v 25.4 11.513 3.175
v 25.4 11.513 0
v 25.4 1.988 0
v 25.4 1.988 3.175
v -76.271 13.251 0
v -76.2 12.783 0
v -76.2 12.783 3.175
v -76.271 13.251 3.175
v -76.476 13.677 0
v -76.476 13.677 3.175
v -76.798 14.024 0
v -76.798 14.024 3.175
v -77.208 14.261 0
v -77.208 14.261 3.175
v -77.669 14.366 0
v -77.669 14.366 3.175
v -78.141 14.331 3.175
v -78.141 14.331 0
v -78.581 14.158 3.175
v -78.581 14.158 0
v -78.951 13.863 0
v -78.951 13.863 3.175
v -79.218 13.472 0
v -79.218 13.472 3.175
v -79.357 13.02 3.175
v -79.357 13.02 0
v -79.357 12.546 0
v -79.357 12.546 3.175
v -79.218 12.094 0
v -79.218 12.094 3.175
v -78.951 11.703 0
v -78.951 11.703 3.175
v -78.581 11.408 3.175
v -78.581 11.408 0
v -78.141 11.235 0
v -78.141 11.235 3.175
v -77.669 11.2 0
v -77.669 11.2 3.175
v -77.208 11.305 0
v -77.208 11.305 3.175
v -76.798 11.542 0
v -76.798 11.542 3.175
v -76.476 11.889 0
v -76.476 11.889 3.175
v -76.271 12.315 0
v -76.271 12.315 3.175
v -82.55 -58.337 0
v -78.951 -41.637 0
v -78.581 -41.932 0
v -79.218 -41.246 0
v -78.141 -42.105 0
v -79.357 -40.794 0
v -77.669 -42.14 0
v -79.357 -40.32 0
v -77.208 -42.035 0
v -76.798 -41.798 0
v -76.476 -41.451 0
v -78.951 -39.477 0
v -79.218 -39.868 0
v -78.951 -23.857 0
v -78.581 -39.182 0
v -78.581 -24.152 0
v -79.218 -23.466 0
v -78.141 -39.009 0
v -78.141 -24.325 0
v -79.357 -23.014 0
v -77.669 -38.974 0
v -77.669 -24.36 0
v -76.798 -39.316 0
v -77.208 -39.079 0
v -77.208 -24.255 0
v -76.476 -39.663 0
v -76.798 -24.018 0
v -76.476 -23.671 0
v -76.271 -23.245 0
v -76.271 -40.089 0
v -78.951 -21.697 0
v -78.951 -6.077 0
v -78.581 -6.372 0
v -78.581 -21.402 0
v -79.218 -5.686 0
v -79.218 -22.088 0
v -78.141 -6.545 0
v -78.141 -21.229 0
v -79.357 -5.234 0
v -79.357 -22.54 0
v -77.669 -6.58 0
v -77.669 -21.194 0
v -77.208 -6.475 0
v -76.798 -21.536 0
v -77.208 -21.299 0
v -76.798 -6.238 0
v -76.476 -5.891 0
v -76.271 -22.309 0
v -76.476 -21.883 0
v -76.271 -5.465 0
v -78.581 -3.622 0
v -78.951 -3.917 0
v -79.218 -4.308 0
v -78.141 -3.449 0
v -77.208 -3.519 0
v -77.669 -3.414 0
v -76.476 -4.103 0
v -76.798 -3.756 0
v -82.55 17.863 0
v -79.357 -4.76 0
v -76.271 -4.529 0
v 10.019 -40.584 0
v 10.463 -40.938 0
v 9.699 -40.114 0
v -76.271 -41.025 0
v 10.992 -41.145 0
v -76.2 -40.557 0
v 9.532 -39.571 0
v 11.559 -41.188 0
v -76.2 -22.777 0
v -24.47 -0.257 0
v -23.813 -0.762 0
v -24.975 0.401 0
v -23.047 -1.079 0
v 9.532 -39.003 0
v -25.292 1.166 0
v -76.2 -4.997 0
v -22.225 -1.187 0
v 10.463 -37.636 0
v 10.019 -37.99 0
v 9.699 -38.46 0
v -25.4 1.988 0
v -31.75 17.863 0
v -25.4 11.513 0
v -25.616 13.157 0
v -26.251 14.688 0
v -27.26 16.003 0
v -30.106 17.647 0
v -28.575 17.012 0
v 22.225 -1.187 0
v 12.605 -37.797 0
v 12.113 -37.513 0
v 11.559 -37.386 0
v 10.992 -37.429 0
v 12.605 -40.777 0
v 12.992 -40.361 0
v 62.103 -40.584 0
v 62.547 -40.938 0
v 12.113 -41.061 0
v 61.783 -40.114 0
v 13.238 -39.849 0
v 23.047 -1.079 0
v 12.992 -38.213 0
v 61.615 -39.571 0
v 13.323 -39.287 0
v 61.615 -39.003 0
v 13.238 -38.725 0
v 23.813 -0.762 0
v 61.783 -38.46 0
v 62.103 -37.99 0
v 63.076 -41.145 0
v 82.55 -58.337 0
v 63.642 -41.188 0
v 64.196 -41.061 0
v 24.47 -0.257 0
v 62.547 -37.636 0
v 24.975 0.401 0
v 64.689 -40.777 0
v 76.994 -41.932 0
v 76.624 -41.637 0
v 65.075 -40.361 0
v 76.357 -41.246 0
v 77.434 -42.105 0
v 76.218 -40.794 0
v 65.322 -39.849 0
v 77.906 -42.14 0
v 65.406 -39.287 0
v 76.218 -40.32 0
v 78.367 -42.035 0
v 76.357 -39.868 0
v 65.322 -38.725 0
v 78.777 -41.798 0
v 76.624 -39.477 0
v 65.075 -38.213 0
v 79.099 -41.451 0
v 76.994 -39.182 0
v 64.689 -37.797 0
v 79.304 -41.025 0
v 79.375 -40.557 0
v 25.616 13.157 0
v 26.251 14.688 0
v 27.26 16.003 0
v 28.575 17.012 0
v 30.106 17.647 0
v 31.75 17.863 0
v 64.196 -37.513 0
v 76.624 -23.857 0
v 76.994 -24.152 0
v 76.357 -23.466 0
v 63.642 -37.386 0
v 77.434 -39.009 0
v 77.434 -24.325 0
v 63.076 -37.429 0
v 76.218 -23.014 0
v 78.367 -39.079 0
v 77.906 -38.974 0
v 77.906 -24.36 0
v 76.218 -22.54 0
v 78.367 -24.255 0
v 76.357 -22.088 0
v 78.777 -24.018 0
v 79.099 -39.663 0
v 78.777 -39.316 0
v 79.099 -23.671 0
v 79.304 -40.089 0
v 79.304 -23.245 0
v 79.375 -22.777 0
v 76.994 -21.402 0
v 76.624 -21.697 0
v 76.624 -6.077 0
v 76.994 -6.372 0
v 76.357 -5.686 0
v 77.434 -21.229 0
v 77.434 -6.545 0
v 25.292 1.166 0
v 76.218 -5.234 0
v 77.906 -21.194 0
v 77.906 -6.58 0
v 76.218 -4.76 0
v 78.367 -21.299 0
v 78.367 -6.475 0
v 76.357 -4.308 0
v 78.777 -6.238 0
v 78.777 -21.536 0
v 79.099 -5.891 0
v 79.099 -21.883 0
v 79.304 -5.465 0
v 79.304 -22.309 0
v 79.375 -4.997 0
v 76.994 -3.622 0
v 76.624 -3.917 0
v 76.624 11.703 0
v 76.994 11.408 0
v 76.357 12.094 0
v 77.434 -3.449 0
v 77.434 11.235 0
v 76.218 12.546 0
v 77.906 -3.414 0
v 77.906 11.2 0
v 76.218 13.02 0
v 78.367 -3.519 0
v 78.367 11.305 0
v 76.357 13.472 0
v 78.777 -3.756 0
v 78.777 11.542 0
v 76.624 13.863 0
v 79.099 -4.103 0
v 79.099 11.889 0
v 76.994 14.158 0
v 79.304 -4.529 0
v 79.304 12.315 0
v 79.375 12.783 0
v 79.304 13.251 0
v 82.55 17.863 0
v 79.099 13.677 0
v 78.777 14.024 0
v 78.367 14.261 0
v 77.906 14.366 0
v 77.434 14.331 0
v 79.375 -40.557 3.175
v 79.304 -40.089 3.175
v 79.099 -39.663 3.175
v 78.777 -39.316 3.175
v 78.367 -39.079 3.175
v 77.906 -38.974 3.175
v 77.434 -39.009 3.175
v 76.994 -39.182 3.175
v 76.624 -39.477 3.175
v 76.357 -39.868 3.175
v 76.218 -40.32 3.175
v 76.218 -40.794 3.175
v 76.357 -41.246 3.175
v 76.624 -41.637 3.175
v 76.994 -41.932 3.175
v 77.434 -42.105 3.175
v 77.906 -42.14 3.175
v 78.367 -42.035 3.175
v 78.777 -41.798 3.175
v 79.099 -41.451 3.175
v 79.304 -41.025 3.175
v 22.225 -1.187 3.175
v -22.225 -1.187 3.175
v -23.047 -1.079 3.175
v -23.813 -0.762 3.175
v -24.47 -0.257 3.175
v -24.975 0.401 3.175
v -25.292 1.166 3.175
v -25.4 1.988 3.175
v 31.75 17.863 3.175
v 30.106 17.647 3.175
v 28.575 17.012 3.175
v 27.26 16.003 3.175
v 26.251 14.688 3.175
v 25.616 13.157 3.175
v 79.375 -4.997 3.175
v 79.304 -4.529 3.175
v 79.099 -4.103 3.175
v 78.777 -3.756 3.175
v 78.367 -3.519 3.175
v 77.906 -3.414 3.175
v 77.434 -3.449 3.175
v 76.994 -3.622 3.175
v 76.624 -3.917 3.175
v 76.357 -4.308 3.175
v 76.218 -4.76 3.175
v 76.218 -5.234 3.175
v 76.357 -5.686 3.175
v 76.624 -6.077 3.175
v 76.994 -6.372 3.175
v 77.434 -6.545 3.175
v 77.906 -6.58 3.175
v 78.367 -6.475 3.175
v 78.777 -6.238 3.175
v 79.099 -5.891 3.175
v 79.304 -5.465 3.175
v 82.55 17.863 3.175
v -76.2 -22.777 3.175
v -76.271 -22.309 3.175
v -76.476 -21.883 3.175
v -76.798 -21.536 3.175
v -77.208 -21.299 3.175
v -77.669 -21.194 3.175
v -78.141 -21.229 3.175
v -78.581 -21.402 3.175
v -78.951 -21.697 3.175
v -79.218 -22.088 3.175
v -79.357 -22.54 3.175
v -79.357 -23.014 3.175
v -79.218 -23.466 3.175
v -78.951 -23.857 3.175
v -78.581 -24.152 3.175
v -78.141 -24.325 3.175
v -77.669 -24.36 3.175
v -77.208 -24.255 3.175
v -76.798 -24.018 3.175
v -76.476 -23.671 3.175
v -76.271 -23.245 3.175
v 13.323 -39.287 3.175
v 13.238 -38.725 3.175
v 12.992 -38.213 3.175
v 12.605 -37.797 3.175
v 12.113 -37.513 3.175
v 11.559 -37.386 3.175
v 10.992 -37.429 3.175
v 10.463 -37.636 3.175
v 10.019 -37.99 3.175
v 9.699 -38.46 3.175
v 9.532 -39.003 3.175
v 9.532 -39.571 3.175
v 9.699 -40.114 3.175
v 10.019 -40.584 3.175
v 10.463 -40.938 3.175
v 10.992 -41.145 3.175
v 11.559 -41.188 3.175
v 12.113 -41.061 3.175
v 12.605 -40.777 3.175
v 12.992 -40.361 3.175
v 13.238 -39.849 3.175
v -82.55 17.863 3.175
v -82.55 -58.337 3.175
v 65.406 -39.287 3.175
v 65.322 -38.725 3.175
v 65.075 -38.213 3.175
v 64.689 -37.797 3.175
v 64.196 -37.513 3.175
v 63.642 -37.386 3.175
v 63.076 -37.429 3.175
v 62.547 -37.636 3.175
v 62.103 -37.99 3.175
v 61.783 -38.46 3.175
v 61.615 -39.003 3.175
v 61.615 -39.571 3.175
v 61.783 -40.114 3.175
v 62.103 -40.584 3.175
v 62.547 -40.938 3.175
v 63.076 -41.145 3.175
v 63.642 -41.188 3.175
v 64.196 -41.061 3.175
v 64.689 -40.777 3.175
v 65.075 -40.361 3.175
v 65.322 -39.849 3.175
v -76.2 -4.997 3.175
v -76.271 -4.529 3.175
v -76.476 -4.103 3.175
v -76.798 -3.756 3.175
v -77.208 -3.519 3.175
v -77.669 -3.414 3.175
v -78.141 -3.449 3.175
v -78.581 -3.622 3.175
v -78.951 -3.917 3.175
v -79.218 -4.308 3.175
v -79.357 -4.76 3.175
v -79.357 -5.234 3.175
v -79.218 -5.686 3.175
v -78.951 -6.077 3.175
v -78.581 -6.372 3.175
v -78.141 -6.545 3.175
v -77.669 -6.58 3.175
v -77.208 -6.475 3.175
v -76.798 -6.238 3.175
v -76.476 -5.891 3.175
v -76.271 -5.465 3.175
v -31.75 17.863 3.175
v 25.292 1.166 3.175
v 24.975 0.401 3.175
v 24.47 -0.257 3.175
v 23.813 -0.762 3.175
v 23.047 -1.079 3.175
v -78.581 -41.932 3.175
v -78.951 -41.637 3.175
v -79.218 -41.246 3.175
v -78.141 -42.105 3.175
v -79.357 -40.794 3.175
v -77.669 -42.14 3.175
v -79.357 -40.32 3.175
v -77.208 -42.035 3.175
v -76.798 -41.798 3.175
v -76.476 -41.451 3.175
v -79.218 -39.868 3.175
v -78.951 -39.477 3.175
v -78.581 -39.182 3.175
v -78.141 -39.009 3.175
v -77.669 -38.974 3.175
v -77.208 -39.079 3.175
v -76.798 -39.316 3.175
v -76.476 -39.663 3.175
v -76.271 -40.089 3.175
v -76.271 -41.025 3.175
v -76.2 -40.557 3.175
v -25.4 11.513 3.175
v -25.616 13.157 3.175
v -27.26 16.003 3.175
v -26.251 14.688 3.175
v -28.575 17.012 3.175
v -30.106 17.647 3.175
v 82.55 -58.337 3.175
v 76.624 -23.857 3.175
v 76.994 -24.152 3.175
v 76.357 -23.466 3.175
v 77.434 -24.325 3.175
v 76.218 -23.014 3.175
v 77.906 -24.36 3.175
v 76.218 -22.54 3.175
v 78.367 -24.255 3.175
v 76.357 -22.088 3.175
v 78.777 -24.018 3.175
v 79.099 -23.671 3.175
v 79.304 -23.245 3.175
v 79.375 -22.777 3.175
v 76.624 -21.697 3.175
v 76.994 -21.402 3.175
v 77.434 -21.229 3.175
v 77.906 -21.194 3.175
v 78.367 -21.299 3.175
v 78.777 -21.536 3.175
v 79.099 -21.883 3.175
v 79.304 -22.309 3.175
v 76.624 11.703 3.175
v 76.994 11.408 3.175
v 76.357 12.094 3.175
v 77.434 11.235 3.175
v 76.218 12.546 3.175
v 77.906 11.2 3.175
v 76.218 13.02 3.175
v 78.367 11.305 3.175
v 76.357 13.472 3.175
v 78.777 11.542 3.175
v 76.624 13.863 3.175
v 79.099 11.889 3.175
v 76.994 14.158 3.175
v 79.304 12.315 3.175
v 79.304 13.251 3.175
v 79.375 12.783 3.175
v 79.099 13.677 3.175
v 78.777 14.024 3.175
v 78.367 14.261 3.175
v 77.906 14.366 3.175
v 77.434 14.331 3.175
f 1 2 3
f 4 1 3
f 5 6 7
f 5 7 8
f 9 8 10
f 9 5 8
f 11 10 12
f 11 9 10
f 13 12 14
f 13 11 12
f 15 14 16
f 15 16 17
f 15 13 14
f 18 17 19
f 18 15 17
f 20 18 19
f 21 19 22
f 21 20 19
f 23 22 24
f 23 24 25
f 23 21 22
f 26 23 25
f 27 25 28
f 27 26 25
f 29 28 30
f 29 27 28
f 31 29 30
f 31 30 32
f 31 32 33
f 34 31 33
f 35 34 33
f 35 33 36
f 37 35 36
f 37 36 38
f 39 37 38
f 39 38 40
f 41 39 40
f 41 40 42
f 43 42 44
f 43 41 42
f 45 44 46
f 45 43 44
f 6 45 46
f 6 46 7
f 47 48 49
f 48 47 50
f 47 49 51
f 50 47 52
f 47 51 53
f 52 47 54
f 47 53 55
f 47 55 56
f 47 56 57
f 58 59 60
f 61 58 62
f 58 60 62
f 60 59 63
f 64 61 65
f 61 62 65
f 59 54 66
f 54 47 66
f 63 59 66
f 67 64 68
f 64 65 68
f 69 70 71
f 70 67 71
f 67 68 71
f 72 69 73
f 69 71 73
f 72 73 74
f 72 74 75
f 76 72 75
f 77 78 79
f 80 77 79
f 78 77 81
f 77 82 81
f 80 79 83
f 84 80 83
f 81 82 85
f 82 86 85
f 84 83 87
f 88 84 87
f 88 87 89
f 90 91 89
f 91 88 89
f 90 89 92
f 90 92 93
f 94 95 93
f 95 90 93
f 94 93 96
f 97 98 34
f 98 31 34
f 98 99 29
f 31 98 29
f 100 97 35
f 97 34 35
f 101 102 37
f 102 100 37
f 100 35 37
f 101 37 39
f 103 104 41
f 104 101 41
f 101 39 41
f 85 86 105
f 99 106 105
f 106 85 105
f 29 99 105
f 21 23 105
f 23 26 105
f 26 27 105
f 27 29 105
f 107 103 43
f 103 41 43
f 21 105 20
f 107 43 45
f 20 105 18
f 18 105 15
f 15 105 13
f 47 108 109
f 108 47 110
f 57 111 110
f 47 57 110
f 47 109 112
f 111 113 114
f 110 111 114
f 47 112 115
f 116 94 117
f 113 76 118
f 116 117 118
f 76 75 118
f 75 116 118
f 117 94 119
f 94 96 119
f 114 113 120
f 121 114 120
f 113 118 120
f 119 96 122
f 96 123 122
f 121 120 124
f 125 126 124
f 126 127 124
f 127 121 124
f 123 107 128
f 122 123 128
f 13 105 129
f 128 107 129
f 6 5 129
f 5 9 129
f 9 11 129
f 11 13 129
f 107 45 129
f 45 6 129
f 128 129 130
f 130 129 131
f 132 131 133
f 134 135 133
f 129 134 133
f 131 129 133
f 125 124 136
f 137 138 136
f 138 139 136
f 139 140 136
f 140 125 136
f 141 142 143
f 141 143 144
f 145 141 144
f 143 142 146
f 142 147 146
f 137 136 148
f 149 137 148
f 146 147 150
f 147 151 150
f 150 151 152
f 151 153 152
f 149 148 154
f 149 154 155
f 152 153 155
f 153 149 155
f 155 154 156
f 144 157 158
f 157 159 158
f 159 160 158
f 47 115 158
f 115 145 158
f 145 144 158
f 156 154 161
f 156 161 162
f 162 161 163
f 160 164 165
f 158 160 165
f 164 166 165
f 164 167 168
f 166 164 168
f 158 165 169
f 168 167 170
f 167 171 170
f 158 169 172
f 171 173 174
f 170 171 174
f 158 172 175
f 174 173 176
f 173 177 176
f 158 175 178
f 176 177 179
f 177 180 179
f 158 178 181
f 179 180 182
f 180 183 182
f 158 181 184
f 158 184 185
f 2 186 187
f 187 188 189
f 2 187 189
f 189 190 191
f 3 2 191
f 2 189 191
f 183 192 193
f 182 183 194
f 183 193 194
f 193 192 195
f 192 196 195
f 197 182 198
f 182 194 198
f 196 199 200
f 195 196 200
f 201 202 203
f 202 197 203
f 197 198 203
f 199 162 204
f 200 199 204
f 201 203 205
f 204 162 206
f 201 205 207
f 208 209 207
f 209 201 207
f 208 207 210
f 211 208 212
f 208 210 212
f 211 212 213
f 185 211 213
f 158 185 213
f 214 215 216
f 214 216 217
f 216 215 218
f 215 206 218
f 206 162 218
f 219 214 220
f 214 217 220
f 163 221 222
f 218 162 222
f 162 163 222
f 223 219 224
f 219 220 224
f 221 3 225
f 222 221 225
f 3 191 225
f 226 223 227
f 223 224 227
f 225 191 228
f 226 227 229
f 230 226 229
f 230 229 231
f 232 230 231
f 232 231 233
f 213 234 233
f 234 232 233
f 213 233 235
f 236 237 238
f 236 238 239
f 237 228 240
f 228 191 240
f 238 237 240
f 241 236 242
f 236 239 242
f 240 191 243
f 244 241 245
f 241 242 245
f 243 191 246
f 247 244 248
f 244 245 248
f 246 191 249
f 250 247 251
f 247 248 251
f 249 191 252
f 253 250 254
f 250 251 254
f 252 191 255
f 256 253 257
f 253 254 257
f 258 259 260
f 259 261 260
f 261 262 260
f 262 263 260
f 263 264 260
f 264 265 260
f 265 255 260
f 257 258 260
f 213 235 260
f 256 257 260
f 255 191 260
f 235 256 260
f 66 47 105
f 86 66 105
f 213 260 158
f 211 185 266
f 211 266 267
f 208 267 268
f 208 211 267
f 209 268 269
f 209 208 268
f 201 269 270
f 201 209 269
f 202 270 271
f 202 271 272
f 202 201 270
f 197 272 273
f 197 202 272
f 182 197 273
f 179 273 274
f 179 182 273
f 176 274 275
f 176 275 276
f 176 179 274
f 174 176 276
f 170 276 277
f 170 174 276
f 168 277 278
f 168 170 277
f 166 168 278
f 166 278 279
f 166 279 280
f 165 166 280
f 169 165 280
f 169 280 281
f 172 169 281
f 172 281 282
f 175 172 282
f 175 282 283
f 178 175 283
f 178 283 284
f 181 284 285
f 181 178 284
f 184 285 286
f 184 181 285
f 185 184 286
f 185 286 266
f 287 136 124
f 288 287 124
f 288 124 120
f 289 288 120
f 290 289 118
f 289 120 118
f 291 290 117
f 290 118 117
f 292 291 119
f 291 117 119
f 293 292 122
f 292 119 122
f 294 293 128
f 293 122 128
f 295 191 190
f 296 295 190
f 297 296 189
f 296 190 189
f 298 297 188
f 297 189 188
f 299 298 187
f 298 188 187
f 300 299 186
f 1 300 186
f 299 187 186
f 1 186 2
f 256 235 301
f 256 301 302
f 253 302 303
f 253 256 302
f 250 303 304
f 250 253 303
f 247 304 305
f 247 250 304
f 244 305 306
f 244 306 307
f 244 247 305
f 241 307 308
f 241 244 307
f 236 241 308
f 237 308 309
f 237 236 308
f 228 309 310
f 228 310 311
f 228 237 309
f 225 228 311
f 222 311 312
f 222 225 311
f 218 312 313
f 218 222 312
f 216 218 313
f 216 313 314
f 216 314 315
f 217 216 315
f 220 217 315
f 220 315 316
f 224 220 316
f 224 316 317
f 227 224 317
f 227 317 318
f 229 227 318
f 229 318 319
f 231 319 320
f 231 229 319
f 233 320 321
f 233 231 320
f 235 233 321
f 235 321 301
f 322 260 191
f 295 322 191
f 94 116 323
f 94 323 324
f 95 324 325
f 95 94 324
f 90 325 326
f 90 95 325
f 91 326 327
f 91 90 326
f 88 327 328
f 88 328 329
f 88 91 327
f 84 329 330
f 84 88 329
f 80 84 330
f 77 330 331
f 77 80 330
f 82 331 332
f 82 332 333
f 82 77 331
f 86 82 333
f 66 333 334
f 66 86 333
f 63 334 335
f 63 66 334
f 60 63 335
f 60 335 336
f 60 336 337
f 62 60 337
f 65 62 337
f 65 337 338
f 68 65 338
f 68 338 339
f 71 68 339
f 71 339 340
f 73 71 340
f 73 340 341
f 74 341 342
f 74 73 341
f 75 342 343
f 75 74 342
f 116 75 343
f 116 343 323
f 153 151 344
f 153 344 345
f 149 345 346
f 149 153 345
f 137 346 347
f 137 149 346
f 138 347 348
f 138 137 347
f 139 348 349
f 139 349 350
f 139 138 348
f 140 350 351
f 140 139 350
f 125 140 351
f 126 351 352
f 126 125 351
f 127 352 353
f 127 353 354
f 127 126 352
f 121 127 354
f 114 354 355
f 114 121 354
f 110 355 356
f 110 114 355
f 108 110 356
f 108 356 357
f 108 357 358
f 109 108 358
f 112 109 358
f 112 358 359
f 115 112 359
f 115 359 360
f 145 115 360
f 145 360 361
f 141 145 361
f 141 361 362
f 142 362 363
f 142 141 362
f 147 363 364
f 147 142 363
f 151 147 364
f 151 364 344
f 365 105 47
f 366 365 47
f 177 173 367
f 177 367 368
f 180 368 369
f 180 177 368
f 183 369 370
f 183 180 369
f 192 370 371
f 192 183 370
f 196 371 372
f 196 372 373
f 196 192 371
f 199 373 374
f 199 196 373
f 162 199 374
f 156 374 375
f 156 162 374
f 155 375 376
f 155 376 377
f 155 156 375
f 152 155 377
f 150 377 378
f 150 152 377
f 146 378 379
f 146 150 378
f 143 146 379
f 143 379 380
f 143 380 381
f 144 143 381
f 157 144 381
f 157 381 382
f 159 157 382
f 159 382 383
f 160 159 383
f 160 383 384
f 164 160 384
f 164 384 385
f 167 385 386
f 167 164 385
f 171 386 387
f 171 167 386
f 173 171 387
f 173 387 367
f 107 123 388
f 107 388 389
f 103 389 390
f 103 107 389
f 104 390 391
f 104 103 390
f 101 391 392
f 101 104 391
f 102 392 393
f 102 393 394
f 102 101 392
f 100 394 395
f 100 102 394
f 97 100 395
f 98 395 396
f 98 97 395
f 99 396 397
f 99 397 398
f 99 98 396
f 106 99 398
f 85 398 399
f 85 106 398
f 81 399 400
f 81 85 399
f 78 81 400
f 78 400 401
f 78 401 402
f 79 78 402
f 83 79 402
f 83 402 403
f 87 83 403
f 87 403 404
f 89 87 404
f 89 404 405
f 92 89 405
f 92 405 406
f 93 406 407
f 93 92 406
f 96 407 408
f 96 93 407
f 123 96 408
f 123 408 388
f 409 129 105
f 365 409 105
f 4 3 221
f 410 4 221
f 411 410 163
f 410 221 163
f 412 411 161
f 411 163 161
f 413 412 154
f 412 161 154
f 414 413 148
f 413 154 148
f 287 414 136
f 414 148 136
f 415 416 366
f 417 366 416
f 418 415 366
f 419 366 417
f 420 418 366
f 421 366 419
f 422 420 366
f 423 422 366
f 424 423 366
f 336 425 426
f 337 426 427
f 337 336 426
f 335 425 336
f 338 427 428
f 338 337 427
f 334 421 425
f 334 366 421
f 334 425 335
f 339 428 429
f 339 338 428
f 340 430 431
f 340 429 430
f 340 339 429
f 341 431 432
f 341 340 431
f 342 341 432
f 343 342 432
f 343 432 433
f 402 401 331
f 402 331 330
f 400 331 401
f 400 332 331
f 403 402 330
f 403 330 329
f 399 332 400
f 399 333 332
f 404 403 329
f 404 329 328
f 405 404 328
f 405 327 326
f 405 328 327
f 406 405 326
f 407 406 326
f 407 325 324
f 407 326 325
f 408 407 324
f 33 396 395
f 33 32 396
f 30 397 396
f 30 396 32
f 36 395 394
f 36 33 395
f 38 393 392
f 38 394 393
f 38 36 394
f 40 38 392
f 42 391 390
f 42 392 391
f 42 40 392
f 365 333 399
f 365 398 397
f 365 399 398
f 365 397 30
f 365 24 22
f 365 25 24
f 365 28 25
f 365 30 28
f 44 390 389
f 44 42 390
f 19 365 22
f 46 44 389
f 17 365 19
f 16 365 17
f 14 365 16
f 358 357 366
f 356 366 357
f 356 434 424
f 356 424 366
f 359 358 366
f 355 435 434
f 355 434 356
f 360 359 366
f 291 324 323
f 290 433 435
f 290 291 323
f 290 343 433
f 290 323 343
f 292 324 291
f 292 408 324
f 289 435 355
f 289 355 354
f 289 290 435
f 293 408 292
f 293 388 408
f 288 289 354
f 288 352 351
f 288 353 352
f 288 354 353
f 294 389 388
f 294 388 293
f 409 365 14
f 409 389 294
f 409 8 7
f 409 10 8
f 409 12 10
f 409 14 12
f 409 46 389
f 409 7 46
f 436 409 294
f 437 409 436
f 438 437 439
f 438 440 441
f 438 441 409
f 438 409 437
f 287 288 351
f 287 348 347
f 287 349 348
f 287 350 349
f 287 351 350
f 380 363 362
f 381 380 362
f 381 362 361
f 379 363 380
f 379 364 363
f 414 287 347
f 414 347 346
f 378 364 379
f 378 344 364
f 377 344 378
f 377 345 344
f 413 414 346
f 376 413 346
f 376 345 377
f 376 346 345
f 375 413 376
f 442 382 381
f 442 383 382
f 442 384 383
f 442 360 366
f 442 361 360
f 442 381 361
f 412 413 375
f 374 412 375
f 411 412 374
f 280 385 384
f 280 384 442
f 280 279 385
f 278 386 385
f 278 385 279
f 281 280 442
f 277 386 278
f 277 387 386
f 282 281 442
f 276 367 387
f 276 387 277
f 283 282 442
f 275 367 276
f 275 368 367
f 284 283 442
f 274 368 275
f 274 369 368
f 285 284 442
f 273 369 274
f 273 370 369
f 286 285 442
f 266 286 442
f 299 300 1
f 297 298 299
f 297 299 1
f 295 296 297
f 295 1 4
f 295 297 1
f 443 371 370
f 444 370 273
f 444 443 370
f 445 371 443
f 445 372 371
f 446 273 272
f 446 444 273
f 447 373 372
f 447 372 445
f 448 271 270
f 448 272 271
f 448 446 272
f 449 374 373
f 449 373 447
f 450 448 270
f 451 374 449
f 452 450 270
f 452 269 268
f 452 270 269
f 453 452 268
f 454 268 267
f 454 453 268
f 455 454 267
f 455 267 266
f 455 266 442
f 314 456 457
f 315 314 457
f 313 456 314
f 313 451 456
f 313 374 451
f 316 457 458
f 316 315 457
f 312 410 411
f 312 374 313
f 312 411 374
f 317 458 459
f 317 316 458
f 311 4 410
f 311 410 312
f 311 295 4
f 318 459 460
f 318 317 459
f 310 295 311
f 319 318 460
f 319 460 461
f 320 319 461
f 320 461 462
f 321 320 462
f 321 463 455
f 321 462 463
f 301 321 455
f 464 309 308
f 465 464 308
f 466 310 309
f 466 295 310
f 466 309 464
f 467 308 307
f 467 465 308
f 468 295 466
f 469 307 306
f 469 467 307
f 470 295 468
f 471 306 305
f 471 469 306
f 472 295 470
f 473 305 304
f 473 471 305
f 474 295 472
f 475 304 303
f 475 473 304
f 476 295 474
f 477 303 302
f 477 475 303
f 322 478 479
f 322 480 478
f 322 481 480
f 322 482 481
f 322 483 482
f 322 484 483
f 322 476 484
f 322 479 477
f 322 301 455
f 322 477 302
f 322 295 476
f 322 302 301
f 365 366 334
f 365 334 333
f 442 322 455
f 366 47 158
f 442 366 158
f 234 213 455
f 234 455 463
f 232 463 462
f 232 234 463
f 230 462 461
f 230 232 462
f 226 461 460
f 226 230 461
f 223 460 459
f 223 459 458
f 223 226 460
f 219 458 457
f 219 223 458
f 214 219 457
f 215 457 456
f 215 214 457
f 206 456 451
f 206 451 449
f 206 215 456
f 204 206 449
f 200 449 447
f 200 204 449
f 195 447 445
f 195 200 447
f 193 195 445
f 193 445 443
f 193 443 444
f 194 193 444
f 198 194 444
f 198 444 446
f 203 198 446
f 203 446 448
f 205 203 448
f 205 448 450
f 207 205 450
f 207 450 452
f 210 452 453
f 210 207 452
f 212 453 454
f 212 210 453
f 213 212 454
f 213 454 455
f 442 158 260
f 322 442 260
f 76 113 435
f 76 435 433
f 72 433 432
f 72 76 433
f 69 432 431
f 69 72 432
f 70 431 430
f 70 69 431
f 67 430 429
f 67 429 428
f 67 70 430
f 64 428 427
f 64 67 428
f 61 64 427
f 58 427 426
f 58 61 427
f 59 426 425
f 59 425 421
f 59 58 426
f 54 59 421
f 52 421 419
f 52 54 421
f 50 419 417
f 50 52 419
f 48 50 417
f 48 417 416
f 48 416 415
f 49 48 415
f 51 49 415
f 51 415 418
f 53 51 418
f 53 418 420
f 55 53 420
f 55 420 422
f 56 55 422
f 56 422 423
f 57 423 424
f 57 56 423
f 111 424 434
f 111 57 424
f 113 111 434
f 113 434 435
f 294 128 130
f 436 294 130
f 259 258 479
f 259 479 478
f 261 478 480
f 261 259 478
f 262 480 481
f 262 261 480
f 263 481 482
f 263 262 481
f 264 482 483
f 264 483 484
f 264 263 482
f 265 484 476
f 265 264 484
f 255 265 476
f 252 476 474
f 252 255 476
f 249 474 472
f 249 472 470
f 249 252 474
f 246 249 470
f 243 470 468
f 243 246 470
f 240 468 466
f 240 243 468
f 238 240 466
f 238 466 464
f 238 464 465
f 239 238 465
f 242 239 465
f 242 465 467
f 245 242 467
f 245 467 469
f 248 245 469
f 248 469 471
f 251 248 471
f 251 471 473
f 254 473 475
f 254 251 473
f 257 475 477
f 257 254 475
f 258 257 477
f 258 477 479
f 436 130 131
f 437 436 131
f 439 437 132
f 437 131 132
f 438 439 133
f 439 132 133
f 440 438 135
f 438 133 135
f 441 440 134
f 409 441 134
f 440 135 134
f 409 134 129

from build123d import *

# Parameters (mm, degrees)
SKETCH5_R           = 1.5875
SKETCH5_R_2         = 1.906243542
BOSS_EXTRUDE2_DEPTH = 3.175


with BuildPart() as part:
    # Sketch5 → Boss-Extrude2 (new body)
    with BuildSketch(Plane.XY):
        with BuildLine():
            Line((-82.55, 17.863023715), (-82.55, -58.336976285))
            Line((-82.55, -58.336976285), (82.55, -58.336976285))
            Line((82.55, -58.336976285), (82.55, 17.863023715))
            Line((82.55, 17.863023715), (31.75, 17.863023715))
            ThreePointArc((31.75, 17.863023715), (27.259871939, 16.003151775), (25.4, 11.513023715))
            Line((25.4, 11.513023715), (25.4, 1.988023715))
            ThreePointArc((25.4, 1.988023715), (24.47006403, -0.257040316), (22.225, -1.186976285))
            Line((22.225, -1.186976285), (-22.225, -1.186976285))
            ThreePointArc((-22.225, -1.186976285), (-24.47006403, -0.257040316), (-25.4, 1.988023715))
            Line((-25.4, 1.988023715), (-25.4, 11.513023715))
            ThreePointArc((-25.4, 11.513023715), (-27.259871939, 16.003151775), (-31.75, 17.863023715))
            Line((-31.75, 17.863023715), (-82.55, 17.863023715))
        make_face()
        with Locations((-77.7875, -40.556976285)):
            Circle(SKETCH5_R, mode=Mode.SUBTRACT)
        with Locations((-77.7875, -22.776976285)):
            Circle(SKETCH5_R, mode=Mode.SUBTRACT)
        with Locations((-77.7875, -4.996976285)):
            Circle(SKETCH5_R, mode=Mode.SUBTRACT)
        with Locations((-77.7875, 12.783023715)):
            Circle(SKETCH5_R, mode=Mode.SUBTRACT)
        with Locations((11.416585625, -39.286976285)):
            Circle(SKETCH5_R_2, mode=Mode.SUBTRACT)
        with Locations((63.5, -39.286976285)):
            Circle(SKETCH5_R_2, mode=Mode.SUBTRACT)
        with Locations((77.7875, 12.783023715)):
            Circle(SKETCH5_R, mode=Mode.SUBTRACT)
        with Locations((77.7875, -4.996976285)):
            Circle(SKETCH5_R, mode=Mode.SUBTRACT)
        with Locations((77.7875, -22.776976285)):
            Circle(SKETCH5_R, mode=Mode.SUBTRACT)
        with Locations((77.7875, -40.556976285)):
            Circle(SKETCH5_R, mode=Mode.SUBTRACT)
    extrude(amount=BOSS_EXTRUDE2_DEPTH)


solid = part.part
